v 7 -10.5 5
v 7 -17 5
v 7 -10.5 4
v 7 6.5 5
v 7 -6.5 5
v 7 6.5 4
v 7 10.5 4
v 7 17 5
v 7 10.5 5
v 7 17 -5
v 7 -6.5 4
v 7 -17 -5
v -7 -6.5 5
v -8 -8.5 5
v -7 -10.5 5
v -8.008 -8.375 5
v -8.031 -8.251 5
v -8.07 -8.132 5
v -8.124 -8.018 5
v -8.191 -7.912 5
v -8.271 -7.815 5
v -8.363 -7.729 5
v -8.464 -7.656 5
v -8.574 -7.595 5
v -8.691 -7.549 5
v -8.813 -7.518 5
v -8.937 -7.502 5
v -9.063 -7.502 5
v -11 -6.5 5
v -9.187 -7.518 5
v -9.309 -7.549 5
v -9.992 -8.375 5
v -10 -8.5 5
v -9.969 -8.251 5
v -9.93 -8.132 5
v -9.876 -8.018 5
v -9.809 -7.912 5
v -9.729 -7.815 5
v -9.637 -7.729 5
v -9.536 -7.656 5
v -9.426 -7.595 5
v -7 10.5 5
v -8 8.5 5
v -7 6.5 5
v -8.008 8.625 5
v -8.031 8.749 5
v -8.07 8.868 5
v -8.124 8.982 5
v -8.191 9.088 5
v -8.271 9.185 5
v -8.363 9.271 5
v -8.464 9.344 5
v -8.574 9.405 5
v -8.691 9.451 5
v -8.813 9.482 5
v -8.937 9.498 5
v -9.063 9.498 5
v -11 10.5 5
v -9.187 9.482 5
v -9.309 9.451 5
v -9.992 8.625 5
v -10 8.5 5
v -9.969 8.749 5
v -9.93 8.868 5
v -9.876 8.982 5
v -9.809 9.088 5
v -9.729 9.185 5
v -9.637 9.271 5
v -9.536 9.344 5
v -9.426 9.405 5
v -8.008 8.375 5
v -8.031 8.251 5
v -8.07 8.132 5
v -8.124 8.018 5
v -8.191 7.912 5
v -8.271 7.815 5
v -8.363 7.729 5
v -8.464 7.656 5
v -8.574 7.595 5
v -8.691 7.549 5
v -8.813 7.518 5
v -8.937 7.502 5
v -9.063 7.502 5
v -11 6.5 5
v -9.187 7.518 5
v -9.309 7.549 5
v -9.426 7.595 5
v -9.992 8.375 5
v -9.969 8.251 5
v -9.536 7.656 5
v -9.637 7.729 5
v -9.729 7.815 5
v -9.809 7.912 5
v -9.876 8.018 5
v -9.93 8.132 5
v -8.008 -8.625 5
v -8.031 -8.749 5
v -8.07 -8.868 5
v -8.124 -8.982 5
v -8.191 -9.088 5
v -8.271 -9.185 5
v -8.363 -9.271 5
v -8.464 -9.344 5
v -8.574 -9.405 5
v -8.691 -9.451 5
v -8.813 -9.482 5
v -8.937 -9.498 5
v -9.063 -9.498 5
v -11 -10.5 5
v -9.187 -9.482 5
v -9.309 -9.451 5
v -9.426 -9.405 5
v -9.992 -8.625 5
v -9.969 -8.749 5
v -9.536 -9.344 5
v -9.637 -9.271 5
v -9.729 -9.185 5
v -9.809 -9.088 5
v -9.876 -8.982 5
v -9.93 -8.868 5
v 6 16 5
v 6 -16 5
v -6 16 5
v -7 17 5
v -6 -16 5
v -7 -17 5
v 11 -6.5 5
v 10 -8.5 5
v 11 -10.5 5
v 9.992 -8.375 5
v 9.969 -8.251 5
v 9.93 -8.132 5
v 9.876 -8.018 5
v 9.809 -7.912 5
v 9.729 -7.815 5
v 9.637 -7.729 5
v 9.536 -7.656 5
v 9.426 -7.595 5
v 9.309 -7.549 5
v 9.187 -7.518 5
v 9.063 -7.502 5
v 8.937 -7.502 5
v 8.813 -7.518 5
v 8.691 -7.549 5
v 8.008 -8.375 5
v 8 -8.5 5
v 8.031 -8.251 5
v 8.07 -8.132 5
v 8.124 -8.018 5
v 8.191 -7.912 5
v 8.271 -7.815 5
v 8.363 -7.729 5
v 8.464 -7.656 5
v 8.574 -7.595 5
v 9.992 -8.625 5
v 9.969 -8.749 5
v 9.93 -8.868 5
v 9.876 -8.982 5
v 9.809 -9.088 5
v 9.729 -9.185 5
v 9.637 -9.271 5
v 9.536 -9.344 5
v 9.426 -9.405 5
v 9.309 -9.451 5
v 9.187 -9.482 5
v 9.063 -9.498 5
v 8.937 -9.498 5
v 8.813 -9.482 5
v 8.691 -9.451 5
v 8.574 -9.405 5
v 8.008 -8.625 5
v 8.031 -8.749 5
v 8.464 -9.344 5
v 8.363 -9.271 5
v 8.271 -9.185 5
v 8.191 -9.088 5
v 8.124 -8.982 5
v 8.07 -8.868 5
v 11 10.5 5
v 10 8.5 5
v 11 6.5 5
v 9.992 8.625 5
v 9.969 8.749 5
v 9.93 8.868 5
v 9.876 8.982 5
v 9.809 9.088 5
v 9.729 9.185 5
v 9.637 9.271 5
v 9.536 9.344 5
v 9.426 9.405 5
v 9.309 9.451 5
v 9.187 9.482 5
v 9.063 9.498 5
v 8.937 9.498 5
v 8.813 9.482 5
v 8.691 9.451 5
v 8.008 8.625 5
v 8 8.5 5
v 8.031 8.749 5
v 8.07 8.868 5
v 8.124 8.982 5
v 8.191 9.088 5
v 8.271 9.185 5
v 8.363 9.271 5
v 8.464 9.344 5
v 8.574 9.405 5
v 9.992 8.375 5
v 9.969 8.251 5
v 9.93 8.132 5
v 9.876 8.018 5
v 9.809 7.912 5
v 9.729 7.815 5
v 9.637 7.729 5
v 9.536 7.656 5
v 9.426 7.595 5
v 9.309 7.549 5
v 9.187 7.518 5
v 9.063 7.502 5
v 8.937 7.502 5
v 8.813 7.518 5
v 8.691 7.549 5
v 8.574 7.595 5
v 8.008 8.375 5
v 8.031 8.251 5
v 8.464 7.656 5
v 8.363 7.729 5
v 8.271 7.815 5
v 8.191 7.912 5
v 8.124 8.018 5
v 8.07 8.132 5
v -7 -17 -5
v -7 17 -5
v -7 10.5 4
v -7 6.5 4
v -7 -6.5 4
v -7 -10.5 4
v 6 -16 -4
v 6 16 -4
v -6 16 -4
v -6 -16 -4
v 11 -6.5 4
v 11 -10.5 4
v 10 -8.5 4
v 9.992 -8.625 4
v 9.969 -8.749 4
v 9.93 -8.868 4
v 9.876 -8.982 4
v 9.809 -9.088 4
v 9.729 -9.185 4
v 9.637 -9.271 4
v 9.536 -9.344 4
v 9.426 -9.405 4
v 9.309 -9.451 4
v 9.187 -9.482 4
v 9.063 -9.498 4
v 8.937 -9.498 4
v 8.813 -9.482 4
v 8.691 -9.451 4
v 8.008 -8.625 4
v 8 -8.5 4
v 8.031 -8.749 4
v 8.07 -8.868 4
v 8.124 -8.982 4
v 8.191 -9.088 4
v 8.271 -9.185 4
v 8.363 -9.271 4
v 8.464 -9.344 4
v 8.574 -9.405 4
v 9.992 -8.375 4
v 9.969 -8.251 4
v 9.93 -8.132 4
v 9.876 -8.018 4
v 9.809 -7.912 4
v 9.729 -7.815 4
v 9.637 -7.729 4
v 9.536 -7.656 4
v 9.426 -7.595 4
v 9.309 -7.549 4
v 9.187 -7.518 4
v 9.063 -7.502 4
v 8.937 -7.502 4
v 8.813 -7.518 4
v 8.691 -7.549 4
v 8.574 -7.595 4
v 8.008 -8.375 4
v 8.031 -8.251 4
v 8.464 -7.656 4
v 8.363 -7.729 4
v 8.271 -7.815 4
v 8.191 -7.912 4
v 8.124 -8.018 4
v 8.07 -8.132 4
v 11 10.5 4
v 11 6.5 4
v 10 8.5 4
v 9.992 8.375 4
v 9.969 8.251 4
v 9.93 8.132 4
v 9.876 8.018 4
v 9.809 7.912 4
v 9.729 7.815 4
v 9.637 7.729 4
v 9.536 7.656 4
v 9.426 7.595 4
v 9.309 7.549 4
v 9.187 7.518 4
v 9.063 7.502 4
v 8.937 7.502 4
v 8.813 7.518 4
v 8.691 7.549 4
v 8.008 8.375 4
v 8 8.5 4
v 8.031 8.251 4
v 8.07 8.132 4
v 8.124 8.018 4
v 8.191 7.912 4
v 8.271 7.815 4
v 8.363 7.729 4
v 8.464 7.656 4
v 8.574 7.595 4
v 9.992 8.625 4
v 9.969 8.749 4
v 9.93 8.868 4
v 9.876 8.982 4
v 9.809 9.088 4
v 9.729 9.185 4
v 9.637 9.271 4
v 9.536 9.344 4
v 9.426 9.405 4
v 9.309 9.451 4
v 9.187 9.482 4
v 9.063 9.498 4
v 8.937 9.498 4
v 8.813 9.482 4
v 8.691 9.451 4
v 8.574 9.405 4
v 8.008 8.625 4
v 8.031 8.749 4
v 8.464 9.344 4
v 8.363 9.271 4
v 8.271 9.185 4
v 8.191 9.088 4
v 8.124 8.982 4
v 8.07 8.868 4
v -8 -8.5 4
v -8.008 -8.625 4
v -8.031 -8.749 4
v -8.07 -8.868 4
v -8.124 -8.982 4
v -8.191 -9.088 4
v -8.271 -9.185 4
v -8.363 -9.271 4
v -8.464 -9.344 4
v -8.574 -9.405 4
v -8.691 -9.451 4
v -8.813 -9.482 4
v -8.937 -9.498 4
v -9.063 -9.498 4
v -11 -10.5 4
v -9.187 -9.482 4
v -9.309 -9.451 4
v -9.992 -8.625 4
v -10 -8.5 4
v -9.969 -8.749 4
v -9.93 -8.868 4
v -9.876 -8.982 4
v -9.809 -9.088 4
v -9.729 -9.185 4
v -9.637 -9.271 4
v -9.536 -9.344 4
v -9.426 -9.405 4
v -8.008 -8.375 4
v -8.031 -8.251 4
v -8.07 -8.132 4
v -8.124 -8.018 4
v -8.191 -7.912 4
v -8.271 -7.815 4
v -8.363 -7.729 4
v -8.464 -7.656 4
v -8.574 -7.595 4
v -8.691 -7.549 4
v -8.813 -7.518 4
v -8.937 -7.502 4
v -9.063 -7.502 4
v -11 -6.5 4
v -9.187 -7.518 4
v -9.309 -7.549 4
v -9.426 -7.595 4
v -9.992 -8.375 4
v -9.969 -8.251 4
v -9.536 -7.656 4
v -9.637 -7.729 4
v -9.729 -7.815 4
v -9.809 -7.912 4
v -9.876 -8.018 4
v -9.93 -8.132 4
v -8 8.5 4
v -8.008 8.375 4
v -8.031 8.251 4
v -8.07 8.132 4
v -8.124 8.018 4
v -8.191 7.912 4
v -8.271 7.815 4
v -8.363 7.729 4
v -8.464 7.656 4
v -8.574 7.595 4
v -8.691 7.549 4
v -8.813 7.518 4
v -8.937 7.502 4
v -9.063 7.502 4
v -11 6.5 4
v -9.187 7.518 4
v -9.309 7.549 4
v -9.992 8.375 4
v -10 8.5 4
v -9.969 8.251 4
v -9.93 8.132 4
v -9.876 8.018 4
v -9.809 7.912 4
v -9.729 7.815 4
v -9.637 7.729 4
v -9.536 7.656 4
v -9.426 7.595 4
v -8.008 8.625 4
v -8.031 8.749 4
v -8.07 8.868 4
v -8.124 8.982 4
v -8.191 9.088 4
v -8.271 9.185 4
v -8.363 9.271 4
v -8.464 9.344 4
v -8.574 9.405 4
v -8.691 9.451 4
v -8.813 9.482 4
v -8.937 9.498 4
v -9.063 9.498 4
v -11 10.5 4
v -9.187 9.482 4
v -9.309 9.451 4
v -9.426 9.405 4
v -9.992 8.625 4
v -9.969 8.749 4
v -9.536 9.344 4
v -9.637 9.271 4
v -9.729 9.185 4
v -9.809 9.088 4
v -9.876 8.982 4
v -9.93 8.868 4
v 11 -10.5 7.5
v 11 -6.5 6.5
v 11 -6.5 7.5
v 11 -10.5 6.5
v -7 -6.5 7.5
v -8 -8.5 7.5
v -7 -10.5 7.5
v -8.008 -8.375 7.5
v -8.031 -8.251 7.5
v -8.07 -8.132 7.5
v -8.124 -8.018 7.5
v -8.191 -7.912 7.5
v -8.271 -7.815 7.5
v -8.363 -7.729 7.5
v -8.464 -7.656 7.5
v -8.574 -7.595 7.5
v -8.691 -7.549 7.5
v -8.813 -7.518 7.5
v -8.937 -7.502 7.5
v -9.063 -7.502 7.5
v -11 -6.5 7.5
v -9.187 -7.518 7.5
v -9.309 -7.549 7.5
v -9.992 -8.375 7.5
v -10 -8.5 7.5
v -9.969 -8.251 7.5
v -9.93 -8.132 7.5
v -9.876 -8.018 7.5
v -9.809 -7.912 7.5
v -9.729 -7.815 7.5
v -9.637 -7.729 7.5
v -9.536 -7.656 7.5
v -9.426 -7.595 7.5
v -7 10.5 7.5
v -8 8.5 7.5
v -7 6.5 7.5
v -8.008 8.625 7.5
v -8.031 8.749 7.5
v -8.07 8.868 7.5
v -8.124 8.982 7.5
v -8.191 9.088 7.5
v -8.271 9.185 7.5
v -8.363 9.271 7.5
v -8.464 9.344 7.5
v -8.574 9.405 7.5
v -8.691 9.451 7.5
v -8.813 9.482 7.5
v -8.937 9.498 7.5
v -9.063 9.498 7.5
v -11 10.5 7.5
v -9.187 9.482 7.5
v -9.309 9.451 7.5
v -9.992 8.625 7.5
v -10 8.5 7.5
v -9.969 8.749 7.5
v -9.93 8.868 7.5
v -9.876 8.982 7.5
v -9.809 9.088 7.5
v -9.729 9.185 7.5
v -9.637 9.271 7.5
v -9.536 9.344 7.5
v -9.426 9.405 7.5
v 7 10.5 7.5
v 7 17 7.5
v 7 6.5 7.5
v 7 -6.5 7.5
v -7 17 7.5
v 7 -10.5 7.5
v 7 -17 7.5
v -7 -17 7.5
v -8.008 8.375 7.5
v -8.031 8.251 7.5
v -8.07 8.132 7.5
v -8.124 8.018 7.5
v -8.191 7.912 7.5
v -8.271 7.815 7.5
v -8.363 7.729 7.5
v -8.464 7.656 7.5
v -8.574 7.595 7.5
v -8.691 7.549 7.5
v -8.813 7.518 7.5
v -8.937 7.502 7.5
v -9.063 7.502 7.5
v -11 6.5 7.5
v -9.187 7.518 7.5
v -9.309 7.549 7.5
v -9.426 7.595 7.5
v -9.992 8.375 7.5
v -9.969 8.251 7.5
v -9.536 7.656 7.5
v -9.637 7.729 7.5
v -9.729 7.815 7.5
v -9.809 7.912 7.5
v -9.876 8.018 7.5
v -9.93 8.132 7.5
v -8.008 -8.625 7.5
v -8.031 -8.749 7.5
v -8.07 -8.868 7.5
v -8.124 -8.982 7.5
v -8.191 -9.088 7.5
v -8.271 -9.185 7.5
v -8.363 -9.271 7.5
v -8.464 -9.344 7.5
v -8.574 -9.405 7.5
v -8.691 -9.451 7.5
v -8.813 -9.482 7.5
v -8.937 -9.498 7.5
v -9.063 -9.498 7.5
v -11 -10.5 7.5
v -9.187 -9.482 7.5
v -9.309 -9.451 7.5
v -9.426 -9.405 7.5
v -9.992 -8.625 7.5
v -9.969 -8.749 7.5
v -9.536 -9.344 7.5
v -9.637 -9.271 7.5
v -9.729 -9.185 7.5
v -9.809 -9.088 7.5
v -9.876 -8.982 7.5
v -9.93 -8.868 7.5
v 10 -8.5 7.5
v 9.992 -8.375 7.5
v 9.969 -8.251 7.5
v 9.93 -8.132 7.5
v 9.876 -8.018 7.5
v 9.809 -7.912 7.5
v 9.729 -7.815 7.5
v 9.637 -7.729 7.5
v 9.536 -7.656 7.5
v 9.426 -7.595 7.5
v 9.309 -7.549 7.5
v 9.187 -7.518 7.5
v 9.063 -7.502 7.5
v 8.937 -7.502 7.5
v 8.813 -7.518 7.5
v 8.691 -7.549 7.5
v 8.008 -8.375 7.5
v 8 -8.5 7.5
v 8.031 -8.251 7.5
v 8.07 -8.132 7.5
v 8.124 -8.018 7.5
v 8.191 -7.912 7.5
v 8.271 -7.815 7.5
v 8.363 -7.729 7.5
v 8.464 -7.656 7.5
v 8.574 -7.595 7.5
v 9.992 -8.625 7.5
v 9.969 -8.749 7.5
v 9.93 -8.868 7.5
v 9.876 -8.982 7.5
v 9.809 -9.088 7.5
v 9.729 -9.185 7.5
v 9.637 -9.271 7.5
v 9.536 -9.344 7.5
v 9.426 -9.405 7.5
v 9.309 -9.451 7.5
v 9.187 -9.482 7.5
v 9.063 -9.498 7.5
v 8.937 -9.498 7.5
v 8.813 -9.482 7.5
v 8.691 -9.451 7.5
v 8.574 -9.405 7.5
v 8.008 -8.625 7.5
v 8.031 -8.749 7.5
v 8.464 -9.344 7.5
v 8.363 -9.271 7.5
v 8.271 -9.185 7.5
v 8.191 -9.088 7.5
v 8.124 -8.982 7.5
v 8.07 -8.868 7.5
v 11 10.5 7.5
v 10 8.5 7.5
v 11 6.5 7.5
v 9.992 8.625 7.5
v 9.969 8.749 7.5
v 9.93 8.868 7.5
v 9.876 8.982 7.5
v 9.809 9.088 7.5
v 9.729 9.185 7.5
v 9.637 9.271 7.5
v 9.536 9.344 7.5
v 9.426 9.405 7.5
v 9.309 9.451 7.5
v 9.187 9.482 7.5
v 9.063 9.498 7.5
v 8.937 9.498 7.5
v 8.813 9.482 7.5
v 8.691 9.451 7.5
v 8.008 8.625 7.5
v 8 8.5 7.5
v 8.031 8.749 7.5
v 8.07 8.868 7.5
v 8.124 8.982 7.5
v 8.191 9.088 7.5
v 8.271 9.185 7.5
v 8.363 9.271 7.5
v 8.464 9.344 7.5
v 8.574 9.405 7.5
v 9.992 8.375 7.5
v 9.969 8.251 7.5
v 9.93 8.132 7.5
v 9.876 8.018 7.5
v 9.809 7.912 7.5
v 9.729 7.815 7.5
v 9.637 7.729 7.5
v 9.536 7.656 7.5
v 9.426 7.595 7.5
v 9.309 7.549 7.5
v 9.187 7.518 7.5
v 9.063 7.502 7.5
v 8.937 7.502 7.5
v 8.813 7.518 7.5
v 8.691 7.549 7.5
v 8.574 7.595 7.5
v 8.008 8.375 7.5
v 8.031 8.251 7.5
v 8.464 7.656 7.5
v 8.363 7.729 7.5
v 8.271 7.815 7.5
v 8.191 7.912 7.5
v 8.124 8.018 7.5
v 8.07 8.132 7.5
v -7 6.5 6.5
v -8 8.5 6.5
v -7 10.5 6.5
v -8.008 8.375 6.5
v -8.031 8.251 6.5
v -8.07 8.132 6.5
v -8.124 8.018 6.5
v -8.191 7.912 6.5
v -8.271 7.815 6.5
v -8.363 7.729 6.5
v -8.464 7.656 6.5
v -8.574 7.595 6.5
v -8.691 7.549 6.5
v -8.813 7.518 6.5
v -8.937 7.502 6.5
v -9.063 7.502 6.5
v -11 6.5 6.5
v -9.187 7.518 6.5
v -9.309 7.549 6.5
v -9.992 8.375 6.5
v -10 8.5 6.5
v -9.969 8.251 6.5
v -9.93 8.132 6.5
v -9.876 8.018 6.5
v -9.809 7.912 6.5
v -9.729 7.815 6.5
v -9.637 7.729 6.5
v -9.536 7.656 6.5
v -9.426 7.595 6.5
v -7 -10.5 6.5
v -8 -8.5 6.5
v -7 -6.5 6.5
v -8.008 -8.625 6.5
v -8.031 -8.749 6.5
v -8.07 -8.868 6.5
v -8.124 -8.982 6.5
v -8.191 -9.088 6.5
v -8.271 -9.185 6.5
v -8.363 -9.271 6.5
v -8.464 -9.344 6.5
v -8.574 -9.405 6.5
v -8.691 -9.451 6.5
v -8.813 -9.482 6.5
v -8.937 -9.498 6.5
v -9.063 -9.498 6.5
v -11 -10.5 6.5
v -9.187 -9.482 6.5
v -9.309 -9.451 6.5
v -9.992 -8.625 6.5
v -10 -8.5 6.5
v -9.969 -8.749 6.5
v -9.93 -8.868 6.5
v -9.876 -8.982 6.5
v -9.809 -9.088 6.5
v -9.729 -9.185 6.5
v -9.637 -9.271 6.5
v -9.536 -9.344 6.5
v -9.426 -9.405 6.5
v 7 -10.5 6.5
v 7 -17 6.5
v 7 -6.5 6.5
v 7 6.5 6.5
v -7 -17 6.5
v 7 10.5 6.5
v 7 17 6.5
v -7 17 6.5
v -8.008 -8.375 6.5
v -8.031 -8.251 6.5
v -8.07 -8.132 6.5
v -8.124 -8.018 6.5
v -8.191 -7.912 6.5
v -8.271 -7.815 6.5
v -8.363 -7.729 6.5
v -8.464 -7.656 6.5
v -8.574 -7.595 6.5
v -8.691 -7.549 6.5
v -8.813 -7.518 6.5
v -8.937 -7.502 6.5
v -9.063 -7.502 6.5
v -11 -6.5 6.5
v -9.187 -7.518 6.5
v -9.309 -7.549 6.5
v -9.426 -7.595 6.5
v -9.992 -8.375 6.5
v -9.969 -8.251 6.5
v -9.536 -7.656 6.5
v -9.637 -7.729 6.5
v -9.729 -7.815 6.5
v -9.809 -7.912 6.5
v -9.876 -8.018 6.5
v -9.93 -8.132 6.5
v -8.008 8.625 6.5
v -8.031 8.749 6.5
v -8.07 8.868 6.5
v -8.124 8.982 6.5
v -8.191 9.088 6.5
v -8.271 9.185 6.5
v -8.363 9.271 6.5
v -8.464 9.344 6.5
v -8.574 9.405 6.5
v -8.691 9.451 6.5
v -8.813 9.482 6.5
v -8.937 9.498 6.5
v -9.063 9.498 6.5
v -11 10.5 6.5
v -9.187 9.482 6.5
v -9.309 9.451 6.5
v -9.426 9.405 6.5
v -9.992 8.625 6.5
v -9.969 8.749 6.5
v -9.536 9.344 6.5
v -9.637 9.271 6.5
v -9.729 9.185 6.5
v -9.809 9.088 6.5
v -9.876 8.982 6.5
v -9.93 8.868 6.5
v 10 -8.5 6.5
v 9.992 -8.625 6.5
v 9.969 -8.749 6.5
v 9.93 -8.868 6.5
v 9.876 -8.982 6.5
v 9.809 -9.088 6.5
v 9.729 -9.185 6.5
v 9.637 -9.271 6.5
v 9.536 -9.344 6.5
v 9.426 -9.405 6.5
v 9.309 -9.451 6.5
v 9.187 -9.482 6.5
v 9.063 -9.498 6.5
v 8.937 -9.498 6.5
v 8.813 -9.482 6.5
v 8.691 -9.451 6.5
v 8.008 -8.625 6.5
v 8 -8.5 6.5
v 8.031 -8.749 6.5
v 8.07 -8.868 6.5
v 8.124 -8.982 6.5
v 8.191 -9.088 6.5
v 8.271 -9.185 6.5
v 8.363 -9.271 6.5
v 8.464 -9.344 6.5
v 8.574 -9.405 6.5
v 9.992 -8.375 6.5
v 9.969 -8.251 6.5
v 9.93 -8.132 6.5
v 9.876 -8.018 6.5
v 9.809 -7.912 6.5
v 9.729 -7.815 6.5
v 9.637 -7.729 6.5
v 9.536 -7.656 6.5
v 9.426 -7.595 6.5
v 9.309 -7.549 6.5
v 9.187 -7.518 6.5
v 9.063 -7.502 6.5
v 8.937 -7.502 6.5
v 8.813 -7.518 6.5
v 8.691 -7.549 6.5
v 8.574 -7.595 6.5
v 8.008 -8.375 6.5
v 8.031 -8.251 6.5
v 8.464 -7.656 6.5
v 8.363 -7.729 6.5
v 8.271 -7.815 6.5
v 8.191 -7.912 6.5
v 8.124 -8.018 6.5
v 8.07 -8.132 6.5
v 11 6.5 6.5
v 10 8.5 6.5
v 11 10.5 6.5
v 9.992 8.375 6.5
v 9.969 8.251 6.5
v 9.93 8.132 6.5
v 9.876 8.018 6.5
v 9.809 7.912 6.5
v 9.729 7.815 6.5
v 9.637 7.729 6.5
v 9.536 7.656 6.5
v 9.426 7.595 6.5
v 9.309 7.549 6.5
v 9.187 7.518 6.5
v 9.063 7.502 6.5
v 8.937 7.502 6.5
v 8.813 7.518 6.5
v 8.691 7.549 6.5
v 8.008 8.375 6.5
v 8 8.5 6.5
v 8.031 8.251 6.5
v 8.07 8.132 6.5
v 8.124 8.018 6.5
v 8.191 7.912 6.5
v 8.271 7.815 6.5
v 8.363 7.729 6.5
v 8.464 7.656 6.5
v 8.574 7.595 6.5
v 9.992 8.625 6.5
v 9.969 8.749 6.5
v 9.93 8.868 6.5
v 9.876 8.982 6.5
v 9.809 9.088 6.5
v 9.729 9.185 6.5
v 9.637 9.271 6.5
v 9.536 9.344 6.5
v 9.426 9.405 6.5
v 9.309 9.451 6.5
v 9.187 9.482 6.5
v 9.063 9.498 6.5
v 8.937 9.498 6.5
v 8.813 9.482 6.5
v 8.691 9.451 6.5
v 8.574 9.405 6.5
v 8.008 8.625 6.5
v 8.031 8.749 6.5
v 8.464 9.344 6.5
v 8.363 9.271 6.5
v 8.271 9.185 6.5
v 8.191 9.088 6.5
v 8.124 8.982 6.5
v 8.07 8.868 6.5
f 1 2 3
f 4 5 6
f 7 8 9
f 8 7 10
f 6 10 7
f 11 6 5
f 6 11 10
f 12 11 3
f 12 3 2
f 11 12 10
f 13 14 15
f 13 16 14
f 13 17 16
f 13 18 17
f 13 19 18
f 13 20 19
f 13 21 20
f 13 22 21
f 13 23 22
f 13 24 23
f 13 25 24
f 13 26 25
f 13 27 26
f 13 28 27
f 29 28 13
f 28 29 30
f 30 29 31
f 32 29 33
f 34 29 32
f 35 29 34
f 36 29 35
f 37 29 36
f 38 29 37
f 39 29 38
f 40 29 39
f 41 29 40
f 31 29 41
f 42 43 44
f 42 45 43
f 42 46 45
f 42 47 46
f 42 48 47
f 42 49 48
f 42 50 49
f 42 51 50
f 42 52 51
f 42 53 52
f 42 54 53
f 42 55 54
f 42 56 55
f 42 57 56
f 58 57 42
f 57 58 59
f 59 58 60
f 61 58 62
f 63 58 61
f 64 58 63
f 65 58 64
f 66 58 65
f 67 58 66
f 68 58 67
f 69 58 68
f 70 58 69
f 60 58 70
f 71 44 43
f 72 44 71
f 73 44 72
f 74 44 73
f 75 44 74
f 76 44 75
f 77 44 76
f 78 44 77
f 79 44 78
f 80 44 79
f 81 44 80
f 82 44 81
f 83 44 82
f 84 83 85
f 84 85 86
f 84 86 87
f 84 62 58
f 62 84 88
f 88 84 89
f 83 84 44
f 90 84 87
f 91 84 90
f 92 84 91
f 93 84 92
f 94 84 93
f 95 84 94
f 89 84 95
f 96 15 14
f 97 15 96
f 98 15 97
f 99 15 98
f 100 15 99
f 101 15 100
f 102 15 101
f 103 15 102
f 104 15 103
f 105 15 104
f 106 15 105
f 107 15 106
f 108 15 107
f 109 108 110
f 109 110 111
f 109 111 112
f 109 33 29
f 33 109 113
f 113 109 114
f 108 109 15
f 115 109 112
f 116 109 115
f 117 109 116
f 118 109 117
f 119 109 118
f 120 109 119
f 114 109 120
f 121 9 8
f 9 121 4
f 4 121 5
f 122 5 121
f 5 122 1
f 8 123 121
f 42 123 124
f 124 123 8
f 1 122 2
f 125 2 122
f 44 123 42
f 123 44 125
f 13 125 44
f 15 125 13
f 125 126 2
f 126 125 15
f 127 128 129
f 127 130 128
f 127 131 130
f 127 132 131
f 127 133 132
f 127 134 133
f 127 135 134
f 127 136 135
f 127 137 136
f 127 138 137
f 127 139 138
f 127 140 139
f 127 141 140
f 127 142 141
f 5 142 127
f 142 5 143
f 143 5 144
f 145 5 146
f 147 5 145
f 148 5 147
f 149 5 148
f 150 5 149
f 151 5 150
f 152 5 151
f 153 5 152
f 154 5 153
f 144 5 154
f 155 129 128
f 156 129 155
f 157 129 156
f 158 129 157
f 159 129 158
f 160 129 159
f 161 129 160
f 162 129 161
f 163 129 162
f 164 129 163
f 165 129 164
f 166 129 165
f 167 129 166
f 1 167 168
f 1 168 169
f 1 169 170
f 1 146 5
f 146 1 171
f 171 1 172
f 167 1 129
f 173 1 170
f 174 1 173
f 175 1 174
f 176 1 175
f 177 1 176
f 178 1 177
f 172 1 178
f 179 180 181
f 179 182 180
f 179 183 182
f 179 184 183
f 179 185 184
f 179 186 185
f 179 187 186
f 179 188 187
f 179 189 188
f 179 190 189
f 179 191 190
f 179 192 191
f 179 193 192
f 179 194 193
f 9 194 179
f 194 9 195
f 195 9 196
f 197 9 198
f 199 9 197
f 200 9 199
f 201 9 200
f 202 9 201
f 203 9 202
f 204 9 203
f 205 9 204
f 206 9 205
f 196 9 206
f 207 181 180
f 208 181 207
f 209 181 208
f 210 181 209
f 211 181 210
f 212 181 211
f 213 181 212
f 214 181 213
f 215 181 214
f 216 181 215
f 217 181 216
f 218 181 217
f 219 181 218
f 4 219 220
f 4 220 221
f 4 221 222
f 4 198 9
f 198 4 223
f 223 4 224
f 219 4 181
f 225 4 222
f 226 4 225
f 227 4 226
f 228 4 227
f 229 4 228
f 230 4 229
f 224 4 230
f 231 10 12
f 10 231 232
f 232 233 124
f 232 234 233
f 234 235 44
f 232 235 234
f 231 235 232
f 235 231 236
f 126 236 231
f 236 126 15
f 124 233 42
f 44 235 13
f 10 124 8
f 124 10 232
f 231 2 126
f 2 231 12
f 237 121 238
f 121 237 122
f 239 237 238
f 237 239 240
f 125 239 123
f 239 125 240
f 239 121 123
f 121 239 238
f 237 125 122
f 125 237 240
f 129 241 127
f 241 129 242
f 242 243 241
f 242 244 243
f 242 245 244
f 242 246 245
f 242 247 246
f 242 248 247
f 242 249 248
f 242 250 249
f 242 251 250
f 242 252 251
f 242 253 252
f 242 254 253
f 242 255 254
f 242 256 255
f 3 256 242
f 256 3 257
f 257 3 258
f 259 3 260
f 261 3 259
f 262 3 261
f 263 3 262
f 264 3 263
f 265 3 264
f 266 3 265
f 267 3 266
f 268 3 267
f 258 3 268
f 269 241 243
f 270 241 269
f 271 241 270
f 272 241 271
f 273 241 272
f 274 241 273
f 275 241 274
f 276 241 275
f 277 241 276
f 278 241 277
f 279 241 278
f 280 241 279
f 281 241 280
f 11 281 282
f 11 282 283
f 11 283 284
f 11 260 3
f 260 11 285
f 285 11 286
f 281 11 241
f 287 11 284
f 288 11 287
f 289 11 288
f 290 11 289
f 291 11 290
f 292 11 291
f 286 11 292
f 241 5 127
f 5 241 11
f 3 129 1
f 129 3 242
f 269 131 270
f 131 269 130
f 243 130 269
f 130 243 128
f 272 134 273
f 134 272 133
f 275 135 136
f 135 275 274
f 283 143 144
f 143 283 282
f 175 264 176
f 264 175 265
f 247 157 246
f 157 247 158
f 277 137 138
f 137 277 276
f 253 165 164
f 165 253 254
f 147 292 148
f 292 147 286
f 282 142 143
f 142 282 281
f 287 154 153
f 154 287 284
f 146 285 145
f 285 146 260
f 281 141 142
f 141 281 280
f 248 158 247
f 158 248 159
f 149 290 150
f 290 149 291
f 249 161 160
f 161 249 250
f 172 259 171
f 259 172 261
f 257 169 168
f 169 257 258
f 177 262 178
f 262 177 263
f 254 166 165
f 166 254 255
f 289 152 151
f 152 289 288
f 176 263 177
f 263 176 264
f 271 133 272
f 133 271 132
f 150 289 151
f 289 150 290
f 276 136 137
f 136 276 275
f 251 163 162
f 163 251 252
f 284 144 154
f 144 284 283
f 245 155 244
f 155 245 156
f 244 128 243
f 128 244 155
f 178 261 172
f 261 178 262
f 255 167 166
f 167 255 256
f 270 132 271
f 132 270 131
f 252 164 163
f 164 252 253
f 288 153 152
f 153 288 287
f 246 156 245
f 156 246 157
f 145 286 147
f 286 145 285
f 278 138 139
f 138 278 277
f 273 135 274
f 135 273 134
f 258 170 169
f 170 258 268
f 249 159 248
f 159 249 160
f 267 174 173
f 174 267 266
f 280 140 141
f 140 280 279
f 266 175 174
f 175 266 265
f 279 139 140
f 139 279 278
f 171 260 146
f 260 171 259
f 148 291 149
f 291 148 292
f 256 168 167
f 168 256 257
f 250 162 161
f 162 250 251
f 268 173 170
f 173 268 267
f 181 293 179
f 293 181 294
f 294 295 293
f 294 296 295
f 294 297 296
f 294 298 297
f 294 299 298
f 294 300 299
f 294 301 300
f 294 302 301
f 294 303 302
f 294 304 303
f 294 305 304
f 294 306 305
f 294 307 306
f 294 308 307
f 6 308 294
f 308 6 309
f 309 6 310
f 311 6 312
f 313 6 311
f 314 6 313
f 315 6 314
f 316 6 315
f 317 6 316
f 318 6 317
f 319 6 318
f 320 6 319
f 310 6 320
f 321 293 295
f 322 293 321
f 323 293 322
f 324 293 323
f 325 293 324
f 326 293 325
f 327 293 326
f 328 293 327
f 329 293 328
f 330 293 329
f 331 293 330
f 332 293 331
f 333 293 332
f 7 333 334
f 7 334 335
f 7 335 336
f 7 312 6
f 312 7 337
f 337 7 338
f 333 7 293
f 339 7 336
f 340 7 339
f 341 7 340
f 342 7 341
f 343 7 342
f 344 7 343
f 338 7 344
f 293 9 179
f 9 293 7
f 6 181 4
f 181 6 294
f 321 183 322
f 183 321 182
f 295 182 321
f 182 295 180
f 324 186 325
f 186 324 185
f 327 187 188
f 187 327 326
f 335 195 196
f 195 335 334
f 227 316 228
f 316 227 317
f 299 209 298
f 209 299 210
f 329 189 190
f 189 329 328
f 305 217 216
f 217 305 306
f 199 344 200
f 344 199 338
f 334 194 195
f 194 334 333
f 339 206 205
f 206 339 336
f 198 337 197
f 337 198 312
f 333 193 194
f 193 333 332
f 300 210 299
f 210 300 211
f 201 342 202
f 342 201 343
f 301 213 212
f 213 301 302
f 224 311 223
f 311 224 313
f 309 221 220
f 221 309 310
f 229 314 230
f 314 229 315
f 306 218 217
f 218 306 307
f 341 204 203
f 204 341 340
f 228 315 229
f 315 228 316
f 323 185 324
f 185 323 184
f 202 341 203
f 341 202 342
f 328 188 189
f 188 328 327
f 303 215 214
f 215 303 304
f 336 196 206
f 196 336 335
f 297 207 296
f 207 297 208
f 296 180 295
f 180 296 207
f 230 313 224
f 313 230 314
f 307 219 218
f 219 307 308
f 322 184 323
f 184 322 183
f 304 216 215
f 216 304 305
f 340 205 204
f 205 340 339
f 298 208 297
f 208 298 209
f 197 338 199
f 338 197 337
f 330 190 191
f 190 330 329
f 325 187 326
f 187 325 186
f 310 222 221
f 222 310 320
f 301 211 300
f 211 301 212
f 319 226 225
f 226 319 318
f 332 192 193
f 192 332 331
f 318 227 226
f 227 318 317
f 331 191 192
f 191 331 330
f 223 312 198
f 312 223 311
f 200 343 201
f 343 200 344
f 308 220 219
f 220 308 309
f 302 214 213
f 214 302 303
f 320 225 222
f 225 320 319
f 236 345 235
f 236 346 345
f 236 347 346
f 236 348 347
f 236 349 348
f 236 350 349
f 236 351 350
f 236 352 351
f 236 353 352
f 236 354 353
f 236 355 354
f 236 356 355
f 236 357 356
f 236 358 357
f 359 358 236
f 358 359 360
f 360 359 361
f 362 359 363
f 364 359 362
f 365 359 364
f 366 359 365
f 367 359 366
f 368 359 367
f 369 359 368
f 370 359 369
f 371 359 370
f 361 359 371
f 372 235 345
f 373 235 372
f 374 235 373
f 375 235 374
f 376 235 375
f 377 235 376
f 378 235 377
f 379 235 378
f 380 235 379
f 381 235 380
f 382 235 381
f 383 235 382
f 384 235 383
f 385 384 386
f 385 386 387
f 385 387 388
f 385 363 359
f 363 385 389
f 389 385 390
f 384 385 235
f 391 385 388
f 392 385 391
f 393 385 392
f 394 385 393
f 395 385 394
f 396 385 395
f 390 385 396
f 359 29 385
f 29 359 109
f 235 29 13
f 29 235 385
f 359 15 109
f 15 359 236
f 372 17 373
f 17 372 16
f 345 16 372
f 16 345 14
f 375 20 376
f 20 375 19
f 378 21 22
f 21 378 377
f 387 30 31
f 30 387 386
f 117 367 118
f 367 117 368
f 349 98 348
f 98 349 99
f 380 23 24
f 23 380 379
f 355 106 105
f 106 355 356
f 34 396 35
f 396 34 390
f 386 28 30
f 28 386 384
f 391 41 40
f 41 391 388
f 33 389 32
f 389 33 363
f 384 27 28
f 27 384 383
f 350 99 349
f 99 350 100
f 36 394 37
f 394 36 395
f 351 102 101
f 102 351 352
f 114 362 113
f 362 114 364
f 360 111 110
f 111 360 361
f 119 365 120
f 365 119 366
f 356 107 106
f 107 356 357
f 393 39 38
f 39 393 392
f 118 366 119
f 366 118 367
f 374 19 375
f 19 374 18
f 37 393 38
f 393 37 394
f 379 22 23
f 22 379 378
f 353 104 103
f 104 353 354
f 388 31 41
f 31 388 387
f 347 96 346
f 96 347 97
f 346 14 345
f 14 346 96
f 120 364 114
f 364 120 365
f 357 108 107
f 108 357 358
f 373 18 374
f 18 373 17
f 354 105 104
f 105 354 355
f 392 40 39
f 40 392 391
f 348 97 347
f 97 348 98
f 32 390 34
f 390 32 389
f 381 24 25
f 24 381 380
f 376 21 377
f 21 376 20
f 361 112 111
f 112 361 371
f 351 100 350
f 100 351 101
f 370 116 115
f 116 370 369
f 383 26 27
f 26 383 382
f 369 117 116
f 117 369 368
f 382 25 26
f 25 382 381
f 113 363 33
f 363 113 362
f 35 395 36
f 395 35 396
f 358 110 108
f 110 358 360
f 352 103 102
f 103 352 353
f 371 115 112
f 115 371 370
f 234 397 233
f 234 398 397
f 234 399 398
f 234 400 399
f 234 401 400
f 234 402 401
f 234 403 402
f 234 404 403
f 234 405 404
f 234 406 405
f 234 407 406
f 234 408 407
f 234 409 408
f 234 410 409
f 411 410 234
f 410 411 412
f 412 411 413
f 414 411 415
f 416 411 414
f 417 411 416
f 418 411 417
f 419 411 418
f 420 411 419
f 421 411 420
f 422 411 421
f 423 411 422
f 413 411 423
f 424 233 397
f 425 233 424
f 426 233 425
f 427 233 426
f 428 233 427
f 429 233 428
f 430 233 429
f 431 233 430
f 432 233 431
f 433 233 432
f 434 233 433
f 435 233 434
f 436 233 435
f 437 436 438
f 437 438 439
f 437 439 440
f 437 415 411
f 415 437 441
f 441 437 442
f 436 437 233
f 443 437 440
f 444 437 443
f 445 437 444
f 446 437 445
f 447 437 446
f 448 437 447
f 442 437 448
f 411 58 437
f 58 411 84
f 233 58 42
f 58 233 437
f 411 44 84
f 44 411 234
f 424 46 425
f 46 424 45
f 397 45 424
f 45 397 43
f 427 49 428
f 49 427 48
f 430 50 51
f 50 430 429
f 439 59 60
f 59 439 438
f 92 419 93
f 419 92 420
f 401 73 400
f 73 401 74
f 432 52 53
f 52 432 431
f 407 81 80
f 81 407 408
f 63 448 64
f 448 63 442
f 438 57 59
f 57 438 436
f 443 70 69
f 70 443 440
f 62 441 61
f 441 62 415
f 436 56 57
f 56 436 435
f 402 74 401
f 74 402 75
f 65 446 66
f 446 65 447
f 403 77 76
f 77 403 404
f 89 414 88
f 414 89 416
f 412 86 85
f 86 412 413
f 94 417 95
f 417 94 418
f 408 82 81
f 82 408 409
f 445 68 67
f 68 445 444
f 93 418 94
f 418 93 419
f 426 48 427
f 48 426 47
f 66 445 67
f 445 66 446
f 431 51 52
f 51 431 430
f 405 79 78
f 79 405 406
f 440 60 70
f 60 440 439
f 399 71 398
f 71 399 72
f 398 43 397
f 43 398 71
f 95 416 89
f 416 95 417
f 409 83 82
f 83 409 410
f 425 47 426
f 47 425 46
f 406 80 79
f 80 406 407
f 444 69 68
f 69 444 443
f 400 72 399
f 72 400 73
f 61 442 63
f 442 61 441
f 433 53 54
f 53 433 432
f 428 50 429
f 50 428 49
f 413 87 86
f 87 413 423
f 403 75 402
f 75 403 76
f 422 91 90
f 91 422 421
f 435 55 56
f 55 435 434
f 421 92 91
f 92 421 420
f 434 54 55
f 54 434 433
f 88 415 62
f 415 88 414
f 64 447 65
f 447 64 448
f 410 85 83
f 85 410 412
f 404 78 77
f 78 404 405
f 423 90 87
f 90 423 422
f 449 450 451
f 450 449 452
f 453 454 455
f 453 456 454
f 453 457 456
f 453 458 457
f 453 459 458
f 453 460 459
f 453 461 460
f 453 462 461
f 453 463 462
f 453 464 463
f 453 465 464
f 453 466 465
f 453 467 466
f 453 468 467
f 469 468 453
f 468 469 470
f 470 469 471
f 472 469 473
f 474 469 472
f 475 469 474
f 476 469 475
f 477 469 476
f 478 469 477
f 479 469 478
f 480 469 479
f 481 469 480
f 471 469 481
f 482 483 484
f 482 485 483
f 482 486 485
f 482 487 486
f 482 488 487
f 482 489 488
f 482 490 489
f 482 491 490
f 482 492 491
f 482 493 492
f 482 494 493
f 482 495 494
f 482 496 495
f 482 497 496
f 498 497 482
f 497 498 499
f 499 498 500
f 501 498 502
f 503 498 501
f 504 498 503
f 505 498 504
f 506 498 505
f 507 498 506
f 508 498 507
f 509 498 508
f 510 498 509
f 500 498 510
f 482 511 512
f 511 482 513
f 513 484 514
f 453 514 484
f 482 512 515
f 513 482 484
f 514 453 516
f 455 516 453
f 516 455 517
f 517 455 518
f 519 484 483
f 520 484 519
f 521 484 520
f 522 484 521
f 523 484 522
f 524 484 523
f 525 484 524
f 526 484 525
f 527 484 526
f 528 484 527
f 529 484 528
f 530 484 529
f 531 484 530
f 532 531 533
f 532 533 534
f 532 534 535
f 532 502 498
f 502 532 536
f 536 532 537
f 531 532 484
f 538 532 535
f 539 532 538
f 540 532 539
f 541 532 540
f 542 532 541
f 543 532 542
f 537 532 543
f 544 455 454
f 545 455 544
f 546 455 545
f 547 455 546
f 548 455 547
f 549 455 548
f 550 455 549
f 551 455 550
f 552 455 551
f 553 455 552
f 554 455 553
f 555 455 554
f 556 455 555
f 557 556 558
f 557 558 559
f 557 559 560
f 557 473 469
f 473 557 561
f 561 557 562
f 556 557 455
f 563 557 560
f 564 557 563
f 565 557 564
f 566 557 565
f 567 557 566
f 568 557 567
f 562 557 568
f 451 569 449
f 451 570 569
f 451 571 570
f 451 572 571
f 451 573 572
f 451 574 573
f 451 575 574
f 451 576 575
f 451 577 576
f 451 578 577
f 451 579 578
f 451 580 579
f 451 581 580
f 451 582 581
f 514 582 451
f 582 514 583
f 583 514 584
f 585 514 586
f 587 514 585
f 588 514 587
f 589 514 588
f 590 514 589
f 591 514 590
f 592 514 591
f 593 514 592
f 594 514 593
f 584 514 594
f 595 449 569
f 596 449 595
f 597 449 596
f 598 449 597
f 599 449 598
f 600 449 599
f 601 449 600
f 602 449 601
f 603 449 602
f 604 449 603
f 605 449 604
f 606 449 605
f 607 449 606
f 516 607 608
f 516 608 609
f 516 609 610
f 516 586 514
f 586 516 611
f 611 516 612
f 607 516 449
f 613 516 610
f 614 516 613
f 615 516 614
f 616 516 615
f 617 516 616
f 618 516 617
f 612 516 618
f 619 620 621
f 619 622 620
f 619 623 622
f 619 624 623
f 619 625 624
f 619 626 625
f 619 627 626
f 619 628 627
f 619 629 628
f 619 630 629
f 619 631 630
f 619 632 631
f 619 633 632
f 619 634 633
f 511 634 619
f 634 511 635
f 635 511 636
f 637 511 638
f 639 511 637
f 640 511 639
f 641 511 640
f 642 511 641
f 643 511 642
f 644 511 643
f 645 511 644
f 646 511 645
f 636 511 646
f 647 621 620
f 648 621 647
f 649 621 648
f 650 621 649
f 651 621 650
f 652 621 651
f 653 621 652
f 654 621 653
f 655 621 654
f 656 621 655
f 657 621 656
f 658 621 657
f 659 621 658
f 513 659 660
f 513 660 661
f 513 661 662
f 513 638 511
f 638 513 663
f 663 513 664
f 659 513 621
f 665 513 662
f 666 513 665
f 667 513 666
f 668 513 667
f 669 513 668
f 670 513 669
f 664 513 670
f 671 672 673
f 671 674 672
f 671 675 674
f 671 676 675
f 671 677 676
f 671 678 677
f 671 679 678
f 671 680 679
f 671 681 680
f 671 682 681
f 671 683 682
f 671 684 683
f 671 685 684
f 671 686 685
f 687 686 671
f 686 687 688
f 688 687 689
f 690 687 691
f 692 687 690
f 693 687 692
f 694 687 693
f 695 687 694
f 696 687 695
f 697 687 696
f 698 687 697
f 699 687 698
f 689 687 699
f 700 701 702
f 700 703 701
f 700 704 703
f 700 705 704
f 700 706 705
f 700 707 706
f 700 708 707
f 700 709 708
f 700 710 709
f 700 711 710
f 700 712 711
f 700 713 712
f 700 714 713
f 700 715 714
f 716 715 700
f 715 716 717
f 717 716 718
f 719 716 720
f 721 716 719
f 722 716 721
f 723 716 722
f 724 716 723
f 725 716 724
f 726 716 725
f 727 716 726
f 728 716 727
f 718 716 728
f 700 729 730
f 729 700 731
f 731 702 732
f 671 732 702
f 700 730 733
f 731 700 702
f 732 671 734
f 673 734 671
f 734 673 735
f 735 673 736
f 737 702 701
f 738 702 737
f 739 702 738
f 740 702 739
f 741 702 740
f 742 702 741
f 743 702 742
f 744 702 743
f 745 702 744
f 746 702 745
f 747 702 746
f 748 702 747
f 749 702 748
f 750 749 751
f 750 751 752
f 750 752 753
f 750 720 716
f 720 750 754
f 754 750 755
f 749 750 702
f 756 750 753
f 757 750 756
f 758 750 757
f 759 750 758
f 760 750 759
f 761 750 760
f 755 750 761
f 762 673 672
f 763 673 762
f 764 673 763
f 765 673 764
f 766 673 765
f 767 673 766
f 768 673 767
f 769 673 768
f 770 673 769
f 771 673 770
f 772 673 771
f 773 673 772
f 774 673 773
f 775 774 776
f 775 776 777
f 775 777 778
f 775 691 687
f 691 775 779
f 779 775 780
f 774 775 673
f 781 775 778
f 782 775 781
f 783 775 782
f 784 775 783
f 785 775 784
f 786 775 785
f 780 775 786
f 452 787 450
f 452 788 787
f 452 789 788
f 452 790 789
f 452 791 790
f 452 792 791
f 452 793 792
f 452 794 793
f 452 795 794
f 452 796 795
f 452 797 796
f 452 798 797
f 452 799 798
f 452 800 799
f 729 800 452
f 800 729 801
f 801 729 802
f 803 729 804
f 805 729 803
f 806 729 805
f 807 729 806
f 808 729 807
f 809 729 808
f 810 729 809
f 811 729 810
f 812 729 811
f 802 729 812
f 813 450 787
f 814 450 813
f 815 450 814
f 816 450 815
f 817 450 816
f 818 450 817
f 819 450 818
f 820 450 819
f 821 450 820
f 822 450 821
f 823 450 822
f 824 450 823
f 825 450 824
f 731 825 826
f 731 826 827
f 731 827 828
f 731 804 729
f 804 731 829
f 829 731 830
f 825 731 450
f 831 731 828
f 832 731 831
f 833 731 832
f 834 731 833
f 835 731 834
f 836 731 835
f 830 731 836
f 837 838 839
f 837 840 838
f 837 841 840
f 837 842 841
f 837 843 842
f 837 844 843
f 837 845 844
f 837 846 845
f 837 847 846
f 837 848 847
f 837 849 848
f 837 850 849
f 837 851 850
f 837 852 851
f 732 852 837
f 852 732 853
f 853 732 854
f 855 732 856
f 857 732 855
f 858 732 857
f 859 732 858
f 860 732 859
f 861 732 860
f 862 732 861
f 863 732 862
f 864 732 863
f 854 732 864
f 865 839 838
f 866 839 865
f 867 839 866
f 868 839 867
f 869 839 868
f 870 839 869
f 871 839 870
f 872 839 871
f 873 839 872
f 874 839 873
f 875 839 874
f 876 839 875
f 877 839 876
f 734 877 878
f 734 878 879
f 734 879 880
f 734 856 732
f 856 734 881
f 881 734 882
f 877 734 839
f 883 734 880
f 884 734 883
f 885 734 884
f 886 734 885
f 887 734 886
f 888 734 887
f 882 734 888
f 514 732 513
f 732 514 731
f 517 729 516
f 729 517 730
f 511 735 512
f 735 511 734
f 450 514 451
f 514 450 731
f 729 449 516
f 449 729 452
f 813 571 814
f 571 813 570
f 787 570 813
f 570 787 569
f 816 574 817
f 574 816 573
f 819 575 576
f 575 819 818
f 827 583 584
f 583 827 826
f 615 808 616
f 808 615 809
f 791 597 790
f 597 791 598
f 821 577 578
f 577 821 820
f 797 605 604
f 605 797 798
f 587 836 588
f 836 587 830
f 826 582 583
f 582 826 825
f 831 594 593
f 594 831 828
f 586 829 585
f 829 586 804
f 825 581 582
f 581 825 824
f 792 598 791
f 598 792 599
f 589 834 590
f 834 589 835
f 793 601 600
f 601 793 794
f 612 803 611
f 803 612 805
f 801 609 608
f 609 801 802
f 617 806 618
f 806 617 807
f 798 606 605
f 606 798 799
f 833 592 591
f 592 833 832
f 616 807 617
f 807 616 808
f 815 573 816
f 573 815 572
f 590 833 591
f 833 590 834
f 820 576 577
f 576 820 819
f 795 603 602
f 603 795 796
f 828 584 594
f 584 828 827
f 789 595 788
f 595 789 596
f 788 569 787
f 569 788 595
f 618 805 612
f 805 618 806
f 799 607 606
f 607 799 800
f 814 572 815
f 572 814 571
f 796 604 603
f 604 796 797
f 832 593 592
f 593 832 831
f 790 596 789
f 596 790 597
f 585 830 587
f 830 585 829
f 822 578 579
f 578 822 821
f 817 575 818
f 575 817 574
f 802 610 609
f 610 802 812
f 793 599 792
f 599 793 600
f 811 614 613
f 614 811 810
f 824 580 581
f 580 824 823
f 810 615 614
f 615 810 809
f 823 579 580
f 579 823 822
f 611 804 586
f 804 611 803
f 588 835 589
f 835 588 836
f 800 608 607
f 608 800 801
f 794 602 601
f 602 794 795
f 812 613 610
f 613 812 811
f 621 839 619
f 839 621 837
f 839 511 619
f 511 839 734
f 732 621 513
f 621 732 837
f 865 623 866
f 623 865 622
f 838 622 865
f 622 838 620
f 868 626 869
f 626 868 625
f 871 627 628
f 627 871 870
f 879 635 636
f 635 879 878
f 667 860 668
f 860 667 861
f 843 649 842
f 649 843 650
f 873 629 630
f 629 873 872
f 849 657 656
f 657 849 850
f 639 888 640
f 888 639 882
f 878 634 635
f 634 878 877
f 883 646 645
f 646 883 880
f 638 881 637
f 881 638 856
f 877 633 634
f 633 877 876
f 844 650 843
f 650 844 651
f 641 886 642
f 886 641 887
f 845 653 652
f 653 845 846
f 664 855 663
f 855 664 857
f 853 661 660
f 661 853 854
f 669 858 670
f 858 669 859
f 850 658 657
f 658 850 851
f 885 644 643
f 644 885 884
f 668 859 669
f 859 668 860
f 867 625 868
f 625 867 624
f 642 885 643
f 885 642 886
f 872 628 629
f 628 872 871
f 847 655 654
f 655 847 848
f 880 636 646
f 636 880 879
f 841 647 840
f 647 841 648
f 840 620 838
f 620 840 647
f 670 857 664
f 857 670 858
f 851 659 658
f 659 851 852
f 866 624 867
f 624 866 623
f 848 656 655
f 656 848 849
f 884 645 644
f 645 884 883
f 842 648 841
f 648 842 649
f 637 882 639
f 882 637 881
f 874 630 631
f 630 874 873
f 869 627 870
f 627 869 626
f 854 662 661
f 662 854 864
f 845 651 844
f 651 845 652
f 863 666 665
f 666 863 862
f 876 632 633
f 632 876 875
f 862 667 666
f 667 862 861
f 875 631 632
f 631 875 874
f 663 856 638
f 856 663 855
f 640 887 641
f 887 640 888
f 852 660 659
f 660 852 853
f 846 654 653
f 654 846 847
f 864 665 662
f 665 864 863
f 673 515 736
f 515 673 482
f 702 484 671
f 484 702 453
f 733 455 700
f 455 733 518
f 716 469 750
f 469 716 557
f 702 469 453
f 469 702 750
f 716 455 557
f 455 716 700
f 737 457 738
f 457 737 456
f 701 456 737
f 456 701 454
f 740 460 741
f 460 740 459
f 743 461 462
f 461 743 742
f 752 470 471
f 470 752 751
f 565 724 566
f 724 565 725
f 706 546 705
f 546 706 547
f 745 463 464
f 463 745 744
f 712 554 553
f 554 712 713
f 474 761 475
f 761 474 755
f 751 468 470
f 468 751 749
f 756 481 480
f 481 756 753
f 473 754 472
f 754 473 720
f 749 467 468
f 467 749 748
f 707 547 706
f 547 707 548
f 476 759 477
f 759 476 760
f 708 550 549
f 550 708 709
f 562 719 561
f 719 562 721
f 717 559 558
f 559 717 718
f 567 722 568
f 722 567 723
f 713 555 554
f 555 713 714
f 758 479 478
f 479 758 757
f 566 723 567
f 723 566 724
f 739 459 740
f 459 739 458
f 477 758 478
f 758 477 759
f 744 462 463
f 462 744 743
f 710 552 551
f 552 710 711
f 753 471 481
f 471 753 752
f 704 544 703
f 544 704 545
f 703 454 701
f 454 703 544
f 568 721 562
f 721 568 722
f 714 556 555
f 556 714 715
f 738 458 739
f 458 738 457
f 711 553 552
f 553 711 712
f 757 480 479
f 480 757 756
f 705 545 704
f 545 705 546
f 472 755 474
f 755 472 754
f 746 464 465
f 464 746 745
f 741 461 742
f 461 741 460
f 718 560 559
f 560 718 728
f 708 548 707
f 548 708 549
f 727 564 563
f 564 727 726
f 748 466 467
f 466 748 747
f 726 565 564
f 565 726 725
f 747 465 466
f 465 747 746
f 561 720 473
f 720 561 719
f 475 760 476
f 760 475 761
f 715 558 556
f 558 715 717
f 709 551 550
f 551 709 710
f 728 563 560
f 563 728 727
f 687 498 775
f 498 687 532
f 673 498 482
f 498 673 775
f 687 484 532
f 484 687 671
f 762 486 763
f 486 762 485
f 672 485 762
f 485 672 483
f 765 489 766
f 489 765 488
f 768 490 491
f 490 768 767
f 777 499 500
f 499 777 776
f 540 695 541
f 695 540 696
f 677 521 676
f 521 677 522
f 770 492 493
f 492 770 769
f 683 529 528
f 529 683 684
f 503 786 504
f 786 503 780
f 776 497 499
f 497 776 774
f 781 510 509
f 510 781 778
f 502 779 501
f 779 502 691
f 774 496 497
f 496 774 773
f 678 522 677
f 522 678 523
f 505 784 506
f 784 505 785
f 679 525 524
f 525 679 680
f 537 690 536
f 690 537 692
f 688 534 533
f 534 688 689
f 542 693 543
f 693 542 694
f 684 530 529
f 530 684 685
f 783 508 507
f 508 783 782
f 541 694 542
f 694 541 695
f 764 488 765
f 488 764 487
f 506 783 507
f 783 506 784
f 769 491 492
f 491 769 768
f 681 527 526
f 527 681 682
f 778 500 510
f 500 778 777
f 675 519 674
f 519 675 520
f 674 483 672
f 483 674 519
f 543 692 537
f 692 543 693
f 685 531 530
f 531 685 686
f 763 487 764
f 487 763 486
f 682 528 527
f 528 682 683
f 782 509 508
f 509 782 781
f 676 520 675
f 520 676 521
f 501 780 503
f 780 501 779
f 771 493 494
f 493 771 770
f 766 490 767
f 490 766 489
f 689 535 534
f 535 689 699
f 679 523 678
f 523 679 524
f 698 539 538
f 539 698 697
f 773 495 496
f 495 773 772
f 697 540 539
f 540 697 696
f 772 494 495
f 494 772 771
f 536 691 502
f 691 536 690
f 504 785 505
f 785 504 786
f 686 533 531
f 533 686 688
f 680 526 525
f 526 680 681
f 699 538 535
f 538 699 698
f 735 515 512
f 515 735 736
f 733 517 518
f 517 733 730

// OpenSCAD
$fn = 50;
in_width = 12;
in_height= 32;
in_depth = 8;
wall_thickness = 1;
out_width = in_width + 2 * wall_thickness;
out_height = in_height + 2 * wall_thickness;
out_depth = in_depth + 2 * wall_thickness;
mounting_hole_diameter = 2;
mounting_hole_size = 4;

module lid_mount(x, y) {
	translate([x, y, 0]) {
		difference() {
			cube([mounting_hole_size, mounting_hole_size, wall_thickness], center=true);
			cylinder(2*wall_thickness, mounting_hole_diameter / 2, center=true);
		}
	}
}

module bottom() {
	difference() {
		// outer
		cube([out_width, out_height, out_depth], center=true);

		// inner
		translate([0, 0, wall_thickness]) {
			cube([in_width, in_height, out_depth], center=true);
		}
	}

	translate([0, 0, (out_depth - wall_thickness) / 2]) {
		lid_mount((out_width + mounting_hole_size) / 2, -out_height / 4);
		lid_mount((out_width + mounting_hole_size) / 2, out_height / 4);
		lid_mount(-(out_width + mounting_hole_size) / 2, -out_height / 4);
		lid_mount(-(out_width + mounting_hole_size) / 2, out_height / 4);
	}
}

module top() {
	translate([0, 0, 0]) {
		cube([out_width, out_height, wall_thickness], center=true);
	}

	lid_mount((out_width + mounting_hole_size) / 2, -out_height / 4);
	lid_mount((out_width + mounting_hole_size) / 2, out_height / 4);
	lid_mount(-(out_width + mounting_hole_size) / 2, -out_height / 4);
	lid_mount(-(out_width + mounting_hole_size) / 2, out_height / 4);
}

bottom();

translate([0, 0, (out_depth + 4 * wall_thickness) / 2]) {
	top();
}
